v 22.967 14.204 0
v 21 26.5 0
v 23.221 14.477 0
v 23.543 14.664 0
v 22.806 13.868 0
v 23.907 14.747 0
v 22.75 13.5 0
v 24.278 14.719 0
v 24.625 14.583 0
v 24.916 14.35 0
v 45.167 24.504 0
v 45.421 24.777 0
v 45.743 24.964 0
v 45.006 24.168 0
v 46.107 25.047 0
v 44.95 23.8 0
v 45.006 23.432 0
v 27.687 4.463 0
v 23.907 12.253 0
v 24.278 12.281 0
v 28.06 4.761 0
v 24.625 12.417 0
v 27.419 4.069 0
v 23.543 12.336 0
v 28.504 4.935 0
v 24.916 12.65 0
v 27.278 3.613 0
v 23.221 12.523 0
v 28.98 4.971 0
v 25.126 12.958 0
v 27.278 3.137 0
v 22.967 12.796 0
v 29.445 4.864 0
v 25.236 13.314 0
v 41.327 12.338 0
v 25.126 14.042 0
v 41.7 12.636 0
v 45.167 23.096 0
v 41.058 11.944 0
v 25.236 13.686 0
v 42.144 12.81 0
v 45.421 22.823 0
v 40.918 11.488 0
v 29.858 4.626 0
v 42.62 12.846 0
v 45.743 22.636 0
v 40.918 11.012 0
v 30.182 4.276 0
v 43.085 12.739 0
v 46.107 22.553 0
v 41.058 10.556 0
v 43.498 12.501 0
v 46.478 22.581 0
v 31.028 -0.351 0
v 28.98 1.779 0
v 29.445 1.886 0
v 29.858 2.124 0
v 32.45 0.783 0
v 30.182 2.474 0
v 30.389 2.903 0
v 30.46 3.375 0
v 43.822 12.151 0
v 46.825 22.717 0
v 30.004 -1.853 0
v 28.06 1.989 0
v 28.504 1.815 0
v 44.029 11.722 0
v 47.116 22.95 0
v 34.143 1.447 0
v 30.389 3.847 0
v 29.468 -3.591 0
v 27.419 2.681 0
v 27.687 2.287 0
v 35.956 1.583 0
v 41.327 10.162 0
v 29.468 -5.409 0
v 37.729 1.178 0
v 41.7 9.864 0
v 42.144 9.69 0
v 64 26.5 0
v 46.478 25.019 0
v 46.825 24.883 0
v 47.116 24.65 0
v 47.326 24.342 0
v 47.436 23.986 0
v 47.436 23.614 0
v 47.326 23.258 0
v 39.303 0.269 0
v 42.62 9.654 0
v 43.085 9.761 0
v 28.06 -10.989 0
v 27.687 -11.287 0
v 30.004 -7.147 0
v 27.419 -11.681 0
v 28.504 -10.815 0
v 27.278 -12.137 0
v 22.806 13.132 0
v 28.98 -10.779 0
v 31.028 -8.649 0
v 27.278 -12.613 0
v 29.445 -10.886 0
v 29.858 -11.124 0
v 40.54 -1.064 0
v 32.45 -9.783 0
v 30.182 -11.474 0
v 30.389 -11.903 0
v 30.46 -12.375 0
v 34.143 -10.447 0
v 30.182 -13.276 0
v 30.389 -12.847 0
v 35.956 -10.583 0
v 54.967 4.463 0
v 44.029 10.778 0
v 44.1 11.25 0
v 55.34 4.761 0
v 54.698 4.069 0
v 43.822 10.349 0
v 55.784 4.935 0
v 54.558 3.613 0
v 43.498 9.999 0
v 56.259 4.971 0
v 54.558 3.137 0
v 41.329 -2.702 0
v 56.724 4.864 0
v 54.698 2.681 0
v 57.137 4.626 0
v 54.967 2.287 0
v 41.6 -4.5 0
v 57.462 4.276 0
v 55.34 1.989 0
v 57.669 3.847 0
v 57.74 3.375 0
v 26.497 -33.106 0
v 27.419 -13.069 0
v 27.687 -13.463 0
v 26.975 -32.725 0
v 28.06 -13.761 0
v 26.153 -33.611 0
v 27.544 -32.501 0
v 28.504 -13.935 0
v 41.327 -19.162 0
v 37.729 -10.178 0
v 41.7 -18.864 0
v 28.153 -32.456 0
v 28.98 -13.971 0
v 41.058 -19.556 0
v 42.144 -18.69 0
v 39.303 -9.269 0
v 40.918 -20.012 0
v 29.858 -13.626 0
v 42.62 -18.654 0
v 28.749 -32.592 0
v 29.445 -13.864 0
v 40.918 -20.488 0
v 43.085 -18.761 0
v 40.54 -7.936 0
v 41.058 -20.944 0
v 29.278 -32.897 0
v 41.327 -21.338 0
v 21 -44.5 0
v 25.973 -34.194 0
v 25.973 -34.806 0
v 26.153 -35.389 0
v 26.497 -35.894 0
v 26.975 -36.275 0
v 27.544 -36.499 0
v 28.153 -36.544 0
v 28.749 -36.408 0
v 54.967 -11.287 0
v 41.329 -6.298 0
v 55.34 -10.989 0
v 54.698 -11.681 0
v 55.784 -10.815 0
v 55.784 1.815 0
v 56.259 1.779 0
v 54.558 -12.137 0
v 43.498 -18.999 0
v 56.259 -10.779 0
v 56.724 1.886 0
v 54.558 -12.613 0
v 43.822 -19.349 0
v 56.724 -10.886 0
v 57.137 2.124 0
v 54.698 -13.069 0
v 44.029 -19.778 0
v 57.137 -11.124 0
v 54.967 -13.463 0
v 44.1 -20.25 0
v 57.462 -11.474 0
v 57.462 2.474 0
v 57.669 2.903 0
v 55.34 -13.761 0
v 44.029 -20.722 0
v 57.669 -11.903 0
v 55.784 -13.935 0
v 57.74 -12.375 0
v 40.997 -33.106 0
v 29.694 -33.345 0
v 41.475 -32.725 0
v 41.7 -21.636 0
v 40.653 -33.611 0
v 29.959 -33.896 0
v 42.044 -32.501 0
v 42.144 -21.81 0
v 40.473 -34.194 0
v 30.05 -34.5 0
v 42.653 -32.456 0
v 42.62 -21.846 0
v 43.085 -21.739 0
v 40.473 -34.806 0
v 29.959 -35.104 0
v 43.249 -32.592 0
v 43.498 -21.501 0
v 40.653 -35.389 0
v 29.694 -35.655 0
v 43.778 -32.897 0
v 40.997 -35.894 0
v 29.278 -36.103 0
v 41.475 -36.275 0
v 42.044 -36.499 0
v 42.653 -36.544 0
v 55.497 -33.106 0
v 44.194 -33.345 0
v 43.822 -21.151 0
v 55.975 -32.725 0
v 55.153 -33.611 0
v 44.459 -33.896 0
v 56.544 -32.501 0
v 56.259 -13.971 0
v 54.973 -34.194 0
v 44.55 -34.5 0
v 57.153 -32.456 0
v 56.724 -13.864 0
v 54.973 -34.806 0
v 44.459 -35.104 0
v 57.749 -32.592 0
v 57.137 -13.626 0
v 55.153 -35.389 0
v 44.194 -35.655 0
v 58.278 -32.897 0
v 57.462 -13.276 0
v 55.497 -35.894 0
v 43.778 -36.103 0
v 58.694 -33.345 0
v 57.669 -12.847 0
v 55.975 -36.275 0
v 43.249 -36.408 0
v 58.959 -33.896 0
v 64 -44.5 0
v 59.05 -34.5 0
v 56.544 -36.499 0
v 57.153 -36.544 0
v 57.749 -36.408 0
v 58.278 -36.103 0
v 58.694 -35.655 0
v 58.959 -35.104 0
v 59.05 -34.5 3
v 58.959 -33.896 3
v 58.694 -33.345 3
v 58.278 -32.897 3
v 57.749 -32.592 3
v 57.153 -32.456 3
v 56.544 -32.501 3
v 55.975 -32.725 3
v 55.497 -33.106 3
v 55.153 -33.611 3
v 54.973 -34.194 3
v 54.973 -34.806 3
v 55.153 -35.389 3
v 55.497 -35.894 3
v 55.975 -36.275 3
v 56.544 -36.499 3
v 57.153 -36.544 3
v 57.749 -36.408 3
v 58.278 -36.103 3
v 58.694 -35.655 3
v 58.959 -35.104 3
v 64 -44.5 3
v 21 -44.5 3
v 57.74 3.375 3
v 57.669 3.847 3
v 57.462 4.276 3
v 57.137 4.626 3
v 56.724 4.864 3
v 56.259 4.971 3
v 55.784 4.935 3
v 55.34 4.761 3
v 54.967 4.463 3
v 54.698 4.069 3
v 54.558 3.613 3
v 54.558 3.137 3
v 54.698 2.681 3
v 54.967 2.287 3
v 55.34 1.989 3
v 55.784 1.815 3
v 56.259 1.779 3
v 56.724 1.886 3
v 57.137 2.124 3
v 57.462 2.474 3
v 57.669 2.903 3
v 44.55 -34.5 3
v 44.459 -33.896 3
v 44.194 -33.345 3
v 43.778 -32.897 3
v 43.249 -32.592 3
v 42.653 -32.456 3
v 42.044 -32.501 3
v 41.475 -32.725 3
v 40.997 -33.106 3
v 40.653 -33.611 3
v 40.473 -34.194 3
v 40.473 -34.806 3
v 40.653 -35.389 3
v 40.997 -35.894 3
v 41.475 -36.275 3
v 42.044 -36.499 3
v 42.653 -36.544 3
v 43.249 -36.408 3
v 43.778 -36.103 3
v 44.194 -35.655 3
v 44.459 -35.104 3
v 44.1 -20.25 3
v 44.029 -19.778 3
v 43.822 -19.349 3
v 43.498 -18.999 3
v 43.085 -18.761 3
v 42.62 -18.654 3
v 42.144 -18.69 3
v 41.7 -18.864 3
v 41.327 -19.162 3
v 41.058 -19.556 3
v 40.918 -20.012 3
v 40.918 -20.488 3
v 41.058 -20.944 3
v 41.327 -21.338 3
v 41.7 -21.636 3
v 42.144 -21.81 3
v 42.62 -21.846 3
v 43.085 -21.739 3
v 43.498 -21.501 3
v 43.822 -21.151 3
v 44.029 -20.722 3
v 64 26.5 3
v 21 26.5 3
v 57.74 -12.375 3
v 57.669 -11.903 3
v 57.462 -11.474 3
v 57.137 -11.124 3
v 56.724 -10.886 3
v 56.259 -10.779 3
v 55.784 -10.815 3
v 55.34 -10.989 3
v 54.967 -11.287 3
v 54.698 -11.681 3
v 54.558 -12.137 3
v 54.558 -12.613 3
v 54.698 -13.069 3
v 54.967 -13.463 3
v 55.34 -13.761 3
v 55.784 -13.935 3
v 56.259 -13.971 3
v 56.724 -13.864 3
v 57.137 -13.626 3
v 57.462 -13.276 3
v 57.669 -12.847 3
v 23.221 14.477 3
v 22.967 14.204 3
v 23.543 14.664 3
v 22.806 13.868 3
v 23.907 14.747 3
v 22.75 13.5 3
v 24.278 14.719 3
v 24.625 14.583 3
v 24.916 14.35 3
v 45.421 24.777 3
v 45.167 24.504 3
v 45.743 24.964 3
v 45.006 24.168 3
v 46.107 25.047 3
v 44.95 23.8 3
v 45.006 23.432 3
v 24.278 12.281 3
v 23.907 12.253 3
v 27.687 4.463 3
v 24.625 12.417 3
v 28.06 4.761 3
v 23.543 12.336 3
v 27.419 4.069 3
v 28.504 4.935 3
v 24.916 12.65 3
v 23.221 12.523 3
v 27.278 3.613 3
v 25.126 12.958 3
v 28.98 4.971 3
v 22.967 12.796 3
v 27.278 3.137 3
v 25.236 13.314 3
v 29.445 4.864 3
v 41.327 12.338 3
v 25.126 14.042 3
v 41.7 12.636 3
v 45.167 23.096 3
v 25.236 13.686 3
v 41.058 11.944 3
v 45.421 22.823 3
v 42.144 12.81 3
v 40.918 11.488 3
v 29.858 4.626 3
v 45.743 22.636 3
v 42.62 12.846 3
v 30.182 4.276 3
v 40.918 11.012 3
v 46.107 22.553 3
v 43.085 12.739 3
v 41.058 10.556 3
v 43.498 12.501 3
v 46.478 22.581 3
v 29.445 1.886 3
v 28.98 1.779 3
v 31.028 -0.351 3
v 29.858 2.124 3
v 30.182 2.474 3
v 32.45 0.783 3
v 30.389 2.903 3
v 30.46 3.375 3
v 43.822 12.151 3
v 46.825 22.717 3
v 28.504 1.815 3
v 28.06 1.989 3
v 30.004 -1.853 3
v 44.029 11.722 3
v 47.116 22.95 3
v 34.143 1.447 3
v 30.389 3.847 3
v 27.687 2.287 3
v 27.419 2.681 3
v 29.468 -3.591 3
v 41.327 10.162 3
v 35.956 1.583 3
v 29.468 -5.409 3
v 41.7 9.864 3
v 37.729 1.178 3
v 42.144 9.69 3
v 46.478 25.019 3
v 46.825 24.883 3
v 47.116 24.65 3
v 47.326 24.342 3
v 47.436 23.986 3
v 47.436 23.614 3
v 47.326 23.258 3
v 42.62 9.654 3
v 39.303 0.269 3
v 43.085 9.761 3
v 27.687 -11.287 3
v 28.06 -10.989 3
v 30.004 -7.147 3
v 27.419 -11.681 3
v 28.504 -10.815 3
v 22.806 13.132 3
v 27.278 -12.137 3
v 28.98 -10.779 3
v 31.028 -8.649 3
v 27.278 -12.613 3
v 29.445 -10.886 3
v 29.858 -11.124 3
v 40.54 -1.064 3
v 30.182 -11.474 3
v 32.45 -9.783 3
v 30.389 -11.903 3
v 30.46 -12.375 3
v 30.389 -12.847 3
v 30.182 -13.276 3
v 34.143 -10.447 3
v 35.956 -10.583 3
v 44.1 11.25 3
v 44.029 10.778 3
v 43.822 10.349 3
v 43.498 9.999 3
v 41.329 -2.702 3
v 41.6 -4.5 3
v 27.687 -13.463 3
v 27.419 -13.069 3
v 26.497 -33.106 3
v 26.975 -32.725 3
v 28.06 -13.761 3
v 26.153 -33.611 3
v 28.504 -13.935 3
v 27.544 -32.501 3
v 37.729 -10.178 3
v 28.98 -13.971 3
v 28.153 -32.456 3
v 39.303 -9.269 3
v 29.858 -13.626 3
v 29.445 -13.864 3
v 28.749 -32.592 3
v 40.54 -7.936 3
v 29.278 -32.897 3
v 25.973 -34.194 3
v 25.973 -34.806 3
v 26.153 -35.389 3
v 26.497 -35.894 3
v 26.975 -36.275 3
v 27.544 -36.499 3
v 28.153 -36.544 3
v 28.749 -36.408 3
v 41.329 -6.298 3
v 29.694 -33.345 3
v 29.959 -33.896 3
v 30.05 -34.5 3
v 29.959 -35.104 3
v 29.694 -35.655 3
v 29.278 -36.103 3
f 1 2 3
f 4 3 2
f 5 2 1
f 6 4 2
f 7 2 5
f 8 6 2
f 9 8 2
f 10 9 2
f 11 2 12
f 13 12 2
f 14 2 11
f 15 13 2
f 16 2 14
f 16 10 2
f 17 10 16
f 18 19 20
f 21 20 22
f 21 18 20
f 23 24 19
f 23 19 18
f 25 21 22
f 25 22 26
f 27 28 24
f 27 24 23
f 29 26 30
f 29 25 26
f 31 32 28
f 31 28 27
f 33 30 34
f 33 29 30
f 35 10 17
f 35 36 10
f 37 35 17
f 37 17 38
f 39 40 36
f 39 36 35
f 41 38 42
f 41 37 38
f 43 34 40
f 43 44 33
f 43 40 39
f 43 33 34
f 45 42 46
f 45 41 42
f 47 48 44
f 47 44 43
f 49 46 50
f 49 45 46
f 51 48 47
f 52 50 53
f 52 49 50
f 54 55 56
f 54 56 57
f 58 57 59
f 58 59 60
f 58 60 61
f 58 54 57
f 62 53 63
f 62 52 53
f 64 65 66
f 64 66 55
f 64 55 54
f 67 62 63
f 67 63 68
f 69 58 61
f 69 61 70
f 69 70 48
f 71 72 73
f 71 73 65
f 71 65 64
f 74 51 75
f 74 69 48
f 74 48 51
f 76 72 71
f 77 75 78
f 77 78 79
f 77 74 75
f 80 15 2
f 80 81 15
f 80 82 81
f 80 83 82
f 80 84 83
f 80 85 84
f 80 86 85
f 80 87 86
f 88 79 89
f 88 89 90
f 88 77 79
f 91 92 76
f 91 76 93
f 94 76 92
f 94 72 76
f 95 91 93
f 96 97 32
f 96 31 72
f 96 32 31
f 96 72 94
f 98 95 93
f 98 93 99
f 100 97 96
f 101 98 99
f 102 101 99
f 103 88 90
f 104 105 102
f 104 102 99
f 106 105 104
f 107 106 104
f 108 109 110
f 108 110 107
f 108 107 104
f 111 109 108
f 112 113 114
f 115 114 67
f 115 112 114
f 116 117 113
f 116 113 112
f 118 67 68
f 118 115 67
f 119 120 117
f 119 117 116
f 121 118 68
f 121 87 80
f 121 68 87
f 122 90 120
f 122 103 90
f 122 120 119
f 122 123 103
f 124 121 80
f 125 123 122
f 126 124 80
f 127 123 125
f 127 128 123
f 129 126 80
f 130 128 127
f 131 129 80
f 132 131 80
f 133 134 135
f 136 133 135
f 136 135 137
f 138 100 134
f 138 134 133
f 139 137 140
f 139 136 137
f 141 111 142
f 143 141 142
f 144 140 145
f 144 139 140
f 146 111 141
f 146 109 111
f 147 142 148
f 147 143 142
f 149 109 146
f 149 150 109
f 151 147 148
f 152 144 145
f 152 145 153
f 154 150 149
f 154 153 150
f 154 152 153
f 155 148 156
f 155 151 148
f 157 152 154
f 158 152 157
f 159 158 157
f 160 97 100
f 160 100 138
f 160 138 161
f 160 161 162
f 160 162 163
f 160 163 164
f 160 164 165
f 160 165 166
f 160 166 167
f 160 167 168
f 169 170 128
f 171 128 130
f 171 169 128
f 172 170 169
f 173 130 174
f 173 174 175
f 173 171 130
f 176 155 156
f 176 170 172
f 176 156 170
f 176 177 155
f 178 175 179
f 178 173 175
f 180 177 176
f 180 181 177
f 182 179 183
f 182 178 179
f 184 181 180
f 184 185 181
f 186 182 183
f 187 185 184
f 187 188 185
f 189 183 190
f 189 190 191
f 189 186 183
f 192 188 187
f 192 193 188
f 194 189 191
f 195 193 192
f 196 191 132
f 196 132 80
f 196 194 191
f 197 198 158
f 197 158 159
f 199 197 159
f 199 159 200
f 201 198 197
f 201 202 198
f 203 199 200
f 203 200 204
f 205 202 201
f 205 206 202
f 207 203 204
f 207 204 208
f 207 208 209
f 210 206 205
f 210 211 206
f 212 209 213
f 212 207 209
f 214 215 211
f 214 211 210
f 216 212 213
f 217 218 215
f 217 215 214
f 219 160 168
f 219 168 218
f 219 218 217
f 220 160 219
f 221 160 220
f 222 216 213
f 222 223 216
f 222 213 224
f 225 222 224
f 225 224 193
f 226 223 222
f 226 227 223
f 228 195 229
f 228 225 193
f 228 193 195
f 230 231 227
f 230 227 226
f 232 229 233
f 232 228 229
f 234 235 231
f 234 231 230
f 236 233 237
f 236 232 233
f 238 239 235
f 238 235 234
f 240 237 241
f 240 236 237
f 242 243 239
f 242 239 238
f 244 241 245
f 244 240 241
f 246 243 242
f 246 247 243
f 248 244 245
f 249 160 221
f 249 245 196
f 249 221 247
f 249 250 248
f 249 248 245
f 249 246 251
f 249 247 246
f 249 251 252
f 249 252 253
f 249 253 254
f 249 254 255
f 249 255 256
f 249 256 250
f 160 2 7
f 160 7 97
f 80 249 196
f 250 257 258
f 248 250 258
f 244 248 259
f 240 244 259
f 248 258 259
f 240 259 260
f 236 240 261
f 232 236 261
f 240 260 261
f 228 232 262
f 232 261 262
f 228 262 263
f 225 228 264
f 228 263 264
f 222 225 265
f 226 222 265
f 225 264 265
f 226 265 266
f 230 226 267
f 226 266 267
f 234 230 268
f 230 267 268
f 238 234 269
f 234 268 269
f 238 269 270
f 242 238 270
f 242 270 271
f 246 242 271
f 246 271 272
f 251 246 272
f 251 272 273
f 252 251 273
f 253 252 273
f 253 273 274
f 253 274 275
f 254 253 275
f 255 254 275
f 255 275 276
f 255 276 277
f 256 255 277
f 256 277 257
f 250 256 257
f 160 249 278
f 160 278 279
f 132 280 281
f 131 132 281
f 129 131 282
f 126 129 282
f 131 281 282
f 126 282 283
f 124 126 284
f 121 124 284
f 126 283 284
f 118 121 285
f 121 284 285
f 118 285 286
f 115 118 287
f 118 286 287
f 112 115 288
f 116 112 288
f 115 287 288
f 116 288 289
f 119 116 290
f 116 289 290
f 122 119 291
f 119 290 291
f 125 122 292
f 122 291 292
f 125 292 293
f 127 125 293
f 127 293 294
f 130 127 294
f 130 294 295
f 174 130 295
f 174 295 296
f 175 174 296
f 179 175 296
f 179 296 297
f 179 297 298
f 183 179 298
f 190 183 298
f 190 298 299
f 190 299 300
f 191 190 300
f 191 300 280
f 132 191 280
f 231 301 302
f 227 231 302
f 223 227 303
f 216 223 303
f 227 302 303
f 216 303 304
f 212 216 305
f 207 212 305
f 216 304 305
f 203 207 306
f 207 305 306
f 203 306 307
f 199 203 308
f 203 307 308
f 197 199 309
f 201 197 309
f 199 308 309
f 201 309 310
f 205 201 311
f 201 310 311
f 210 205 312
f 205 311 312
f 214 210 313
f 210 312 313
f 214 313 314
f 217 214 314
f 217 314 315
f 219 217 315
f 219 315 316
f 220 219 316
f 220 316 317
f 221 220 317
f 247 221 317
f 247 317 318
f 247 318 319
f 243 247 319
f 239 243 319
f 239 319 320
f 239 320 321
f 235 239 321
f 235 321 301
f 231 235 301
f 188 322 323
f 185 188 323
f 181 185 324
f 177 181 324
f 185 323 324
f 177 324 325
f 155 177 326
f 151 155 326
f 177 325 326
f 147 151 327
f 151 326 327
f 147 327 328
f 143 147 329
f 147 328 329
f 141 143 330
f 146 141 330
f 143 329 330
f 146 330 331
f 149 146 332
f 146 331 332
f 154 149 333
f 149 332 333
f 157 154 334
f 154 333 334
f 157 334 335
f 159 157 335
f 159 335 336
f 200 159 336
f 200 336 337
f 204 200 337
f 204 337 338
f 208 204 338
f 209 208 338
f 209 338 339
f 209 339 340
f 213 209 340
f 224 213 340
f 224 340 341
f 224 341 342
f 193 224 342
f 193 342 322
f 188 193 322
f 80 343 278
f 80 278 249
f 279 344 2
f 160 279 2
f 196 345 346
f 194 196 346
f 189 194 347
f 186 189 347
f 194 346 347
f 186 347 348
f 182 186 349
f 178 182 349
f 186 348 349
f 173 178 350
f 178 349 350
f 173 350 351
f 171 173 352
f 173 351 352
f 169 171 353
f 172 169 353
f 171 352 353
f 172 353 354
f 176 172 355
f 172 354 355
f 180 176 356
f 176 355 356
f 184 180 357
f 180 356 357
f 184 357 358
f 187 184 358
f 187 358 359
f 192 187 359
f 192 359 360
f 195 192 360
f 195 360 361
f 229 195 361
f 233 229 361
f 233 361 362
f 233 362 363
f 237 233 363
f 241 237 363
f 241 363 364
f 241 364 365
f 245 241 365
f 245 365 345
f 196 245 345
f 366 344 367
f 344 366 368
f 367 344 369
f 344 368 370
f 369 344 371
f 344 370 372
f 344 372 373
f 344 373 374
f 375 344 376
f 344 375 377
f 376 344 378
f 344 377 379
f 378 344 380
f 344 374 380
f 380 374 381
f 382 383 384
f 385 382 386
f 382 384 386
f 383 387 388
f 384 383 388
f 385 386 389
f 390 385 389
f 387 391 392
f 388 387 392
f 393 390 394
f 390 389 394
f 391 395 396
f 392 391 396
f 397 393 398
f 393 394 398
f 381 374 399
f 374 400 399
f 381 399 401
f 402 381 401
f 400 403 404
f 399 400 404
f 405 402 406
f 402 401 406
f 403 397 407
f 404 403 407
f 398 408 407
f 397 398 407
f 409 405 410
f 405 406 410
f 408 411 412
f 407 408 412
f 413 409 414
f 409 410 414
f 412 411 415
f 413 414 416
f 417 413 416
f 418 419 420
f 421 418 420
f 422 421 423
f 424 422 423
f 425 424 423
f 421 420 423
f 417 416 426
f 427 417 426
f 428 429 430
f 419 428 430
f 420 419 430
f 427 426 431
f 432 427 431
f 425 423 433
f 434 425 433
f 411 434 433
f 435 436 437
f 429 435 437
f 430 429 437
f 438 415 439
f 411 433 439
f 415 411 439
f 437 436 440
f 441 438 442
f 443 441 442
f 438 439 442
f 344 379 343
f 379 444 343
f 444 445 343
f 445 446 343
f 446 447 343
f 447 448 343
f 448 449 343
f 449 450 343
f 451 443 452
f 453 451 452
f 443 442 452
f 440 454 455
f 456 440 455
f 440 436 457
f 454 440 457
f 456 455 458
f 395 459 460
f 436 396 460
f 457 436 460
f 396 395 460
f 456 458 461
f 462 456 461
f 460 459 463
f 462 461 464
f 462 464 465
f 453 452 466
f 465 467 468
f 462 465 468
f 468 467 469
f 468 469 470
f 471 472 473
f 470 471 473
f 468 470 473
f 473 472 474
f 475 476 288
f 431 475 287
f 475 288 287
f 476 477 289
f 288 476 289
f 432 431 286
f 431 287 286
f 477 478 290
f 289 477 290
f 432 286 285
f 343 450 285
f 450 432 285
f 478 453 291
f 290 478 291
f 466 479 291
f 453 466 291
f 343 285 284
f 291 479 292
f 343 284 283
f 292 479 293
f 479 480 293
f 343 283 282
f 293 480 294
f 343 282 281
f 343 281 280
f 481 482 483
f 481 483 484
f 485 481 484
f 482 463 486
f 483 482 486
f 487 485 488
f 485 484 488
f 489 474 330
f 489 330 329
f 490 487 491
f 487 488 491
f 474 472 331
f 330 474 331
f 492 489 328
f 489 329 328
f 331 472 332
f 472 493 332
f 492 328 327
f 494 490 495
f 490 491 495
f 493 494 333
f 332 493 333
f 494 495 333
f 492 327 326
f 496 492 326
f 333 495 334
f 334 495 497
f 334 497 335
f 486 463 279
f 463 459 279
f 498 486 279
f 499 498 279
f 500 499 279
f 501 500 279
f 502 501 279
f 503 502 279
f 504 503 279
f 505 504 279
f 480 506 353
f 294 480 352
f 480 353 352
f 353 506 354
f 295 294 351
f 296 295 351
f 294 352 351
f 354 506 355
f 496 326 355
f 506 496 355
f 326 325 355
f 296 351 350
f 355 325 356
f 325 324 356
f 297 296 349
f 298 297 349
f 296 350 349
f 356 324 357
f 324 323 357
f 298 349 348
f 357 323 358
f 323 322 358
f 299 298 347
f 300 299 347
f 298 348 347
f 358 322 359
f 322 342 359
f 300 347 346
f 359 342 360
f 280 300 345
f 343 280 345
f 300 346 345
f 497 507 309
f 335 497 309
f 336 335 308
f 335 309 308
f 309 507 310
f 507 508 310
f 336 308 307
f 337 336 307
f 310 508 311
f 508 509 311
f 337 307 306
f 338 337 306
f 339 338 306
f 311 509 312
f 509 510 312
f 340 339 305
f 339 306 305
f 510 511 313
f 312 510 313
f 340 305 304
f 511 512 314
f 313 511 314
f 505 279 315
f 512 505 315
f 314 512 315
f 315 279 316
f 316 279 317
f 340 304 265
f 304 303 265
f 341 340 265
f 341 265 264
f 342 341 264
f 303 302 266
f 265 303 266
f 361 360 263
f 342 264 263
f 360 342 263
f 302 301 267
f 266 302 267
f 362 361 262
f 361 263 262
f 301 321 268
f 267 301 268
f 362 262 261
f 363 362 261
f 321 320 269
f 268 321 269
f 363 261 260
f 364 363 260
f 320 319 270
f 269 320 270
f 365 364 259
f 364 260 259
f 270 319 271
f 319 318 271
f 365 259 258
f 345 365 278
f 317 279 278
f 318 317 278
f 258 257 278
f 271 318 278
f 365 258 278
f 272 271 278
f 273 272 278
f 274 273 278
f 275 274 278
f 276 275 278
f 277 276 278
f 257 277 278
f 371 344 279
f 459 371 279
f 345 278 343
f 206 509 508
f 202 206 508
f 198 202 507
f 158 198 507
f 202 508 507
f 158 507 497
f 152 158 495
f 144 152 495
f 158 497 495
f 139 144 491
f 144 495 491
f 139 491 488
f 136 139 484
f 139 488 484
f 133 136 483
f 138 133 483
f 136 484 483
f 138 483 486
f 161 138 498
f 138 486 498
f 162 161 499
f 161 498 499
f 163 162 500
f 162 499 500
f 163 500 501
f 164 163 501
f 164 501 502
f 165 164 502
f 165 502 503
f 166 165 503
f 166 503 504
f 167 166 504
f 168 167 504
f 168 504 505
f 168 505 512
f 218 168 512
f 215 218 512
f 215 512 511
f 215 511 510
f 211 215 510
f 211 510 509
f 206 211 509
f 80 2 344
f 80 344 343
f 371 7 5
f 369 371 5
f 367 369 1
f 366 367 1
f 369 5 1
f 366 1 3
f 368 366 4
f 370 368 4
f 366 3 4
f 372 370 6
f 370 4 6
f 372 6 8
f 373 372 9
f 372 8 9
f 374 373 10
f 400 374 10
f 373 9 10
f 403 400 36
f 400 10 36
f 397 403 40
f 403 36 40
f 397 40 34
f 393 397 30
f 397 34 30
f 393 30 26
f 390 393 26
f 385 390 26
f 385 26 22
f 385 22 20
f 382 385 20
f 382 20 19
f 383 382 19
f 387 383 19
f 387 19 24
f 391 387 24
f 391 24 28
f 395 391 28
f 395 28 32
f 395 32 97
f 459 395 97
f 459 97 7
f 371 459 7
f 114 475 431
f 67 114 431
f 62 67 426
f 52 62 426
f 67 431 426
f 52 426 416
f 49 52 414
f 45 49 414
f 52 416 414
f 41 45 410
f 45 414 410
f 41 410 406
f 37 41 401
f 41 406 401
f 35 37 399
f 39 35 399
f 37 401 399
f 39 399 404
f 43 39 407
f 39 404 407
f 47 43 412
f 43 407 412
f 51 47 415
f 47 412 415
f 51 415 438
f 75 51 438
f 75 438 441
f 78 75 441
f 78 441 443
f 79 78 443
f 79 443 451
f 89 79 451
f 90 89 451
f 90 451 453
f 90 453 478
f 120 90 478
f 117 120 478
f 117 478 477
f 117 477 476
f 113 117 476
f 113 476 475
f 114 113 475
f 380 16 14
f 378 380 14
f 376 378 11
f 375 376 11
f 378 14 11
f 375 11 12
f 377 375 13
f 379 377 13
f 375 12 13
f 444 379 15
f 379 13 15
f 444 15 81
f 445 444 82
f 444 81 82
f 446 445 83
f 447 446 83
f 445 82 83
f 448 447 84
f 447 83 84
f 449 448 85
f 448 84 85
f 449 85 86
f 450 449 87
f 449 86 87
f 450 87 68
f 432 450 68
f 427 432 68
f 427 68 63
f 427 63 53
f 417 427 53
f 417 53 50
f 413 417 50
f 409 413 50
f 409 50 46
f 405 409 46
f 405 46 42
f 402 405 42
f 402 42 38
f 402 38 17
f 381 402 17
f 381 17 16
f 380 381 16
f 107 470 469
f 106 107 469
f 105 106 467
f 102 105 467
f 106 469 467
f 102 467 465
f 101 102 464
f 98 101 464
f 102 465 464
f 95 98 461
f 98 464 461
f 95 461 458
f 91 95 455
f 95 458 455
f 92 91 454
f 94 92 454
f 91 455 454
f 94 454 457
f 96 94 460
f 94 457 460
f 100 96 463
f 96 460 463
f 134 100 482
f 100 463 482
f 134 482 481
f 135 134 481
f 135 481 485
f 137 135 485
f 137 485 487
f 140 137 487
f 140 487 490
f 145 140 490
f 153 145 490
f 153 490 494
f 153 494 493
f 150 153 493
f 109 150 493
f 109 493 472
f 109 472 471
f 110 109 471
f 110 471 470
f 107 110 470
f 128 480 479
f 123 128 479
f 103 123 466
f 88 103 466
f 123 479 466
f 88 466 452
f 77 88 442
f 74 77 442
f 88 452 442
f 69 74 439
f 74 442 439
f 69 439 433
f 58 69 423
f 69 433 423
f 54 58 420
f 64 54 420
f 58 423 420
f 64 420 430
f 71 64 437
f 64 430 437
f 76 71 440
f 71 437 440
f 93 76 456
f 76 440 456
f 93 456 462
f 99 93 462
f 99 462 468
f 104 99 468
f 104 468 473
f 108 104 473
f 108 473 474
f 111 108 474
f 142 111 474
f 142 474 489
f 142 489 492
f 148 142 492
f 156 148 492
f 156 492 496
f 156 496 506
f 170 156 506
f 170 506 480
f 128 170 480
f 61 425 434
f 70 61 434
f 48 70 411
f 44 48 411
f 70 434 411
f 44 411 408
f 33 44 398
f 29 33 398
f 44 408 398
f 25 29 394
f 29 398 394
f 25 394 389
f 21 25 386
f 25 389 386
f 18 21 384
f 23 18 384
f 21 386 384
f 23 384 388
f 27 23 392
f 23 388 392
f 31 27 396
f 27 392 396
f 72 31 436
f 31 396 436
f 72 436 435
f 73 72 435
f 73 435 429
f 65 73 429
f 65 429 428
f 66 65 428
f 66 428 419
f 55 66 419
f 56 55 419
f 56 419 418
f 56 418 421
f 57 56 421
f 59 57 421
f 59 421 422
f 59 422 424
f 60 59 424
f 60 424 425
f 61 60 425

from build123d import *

# Parameters (mm, degrees)
SKETCH_1_W               = 40
SKETCH_1_H               = 29
EXTRUDE_1_DEPTH          = 3
CUT_EXTRUDE_1_DEPTH      = 3
SKETCH_3_W               = 40
SKETCH_3_H               = 3
EXTRUDE_2_DEPTH          = 10
SKETCH_4_W               = 40
SKETCH_4_H               = 3
EXTRUDE_3_DEPTH          = 10
SKETCH_6_W               = 3
SKETCH_6_H               = 49
EXTRUDE_5_DEPTH          = 42
SKETCH_8_W               = 3
SKETCH_8_H               = 49
EXTRUDE_6_DEPTH          = 2
SKETCH_9_W               = 3
SKETCH_9_H               = 49
EXTRUDE_7_DEPTH          = 2
SKETCH_10_W              = 86
SKETCH_10_H              = 3
EXTRUDE_8_DEPTH          = 10
SKETCH_11_W              = 86
SKETCH_11_H              = 3
EXTRUDE_9_DEPTH          = 10
SKETCH_14_W              = 3
SKETCH_14_H              = 69
CUT_EXTRUDE_5_DEPTH      = 43
SKETCH_17_W              = 43
SKETCH_17_H              = 3
EXTRUDE_10_DEPTH         = 20
SKETCH_18_R              = 2.05
CUT_EXTRUDE_6_DEPTH      = 10
SKETCH_20_W              = 43
SKETCH_20_H              = 3
EXTRUDE_11_DEPTH         = 10
SKETCH_21_W              = 43
SKETCH_21_H              = 3
CUT_EXTRUDE_7_DEPTH      = 10
SKETCH_24_W              = 43
SKETCH_24_H              = 3
EXTRUDE_12_DEPTH         = 10
SKETCH_28_R              = 1.6
SKETCH_28_R_2            = 6.1
CUT_EXTRUDE_9_DEPTH      = 10
SKETCH_29_W              = 43
SKETCH_29_H              = 3
CUT_EXTRUDE_10_DEPTH     = 20
SKETCH_30_R              = 2.05
CUT_EXTRUDE_11_DEPTH     = 10
M3X0_5_1_D               = 2.5
M3X0_5_1_DEPTH           = 8.5
M3X0_5_1_TIP             = 0.751075774
M3X0_5_1_ON_FACE_2_D     = 2.5
M3X0_5_1_ON_FACE_2_DEPTH = 8.5
M3X0_5_1_ON_FACE_2_TIP   = 0.751075774
SKETCH_32_W              = 43
SKETCH_32_H              = 3
CUT_EXTRUDE_12_DEPTH     = 8


with BuildPart() as part:
    # ｽｹｯﾁ1 → ﾎﾞｽ - 押し出し1 (new body)
    with BuildSketch(Plane.XY):
        Rectangle(SKETCH_1_W, SKETCH_1_H)
    extrude(amount=EXTRUDE_1_DEPTH)

    # ｽｹｯﾁ2 → ｶｯﾄ - 押し出し1 (cut)
    with BuildSketch(Plane.XY.offset(3)):
        with BuildLine():
            ThreePointArc((-14.4, 10.5), (-15.01507576, 11.98492424), (-16.5, 12.6))
            Line((-16.5, 12.6), (-16.5, 10.5))
            Line((-16.5, 10.5), (-18.6, 10.5))
            ThreePointArc((-18.6, 10.5), (-16.5, 8.4), (-14.4, 10.5))
        make_face()
        with BuildLine():
            Line((-16.5, 10.5), (-16.5, 12.6))
            ThreePointArc((-16.5, 12.6), (-17.98492424, 11.98492424), (-18.6, 10.5))
            Line((-18.6, 10.5), (-16.5, 10.5))
        make_face()
        with BuildLine():
            ThreePointArc((-18.6, -10.5), (-17.98492424, -11.98492424), (-16.5, -12.6))
            Line((-16.5, -12.6), (-16.5, -10.5))
            Line((-16.5, -10.5), (-18.6, -10.5))
        make_face()
        with BuildLine():
            Line((-16.5, -10.5), (-16.5, -12.6))
            ThreePointArc((-16.5, -12.6), (-15.01507576, -11.98492424), (-14.4, -10.5))
            ThreePointArc((-14.4, -10.5), (-16.5, -8.4), (-18.6, -10.5))
            Line((-18.6, -10.5), (-16.5, -10.5))
        make_face()
        with BuildLine():
            ThreePointArc((18.6, -10.5), (15.01507576, -9.01507576), (16.5, -12.6))
            Line((16.5, -12.6), (16.5, -10.5))
            Line((16.5, -10.5), (18.6, -10.5))
        make_face()
        with BuildLine():
            Line((16.5, -10.5), (16.5, -12.6))
            ThreePointArc((16.5, -12.6), (17.98492424, -11.98492424), (18.6, -10.5))
            Line((18.6, -10.5), (16.5, -10.5))
        make_face()
        with BuildLine():
            ThreePointArc((18.6, 10.5), (17.98492424, 11.98492424), (16.5, 12.6))
            Line((16.5, 12.6), (16.5, 10.5))
            Line((16.5, 10.5), (18.6, 10.5))
        make_face()
        with BuildLine():
            Line((16.5, 10.5), (16.5, 12.6))
            ThreePointArc((16.5, 12.6), (15.01507576, 9.01507576), (18.6, 10.5))
            Line((18.6, 10.5), (16.5, 10.5))
        make_face()
    extrude(amount=-CUT_EXTRUDE_1_DEPTH, mode=Mode.SUBTRACT)

    # ｽｹｯﾁ3 → ﾎﾞｽ - 押し出し2 (add)
    with BuildSketch(Plane.XZ.offset(14.5)):
        with Locations((0, 1.5)):
            Rectangle(SKETCH_3_W, SKETCH_3_H)
    extrude(amount=EXTRUDE_2_DEPTH)

    # ｽｹｯﾁ4 → ﾎﾞｽ - 押し出し3 (add)
    with BuildSketch(Plane(origin=(0, 14.5, 0), x_dir=(1, 0, 0), z_dir=(0, 1, 0))):
        with Locations((0, -1.5)):
            Rectangle(SKETCH_4_W, SKETCH_4_H)
    extrude(amount=EXTRUDE_3_DEPTH)

    # ｽｹｯﾁ6 → ﾎﾞｽ - 押し出し5 (add)
    with BuildSketch(Plane(origin=(20, 0, 0), x_dir=(0, 0, -1), z_dir=(1, 0, 0))):
        with Locations((-1.5, 0)):
            Rectangle(SKETCH_6_W, SKETCH_6_H)
    extrude(amount=EXTRUDE_5_DEPTH)

    # ｽｹｯﾁ8 → ﾎﾞｽ - 押し出し6 (add)
    with BuildSketch(Plane.ZY.offset(20)):
        with Locations((1.5, 0)):
            Rectangle(SKETCH_8_W, SKETCH_8_H)
    extrude(amount=EXTRUDE_6_DEPTH)

    # ｽｹｯﾁ9 → ﾎﾞｽ - 押し出し7 (add)
    with BuildSketch(Plane(origin=(62, 0, 0), x_dir=(0, 0, -1), z_dir=(1, 0, 0))):
        with Locations((-1.5, 0)):
            Rectangle(SKETCH_9_W, SKETCH_9_H)
    extrude(amount=EXTRUDE_7_DEPTH)

    # ｽｹｯﾁ10 → ﾎﾞｽ - 押し出し8 (add)
    with BuildSketch(Plane.XZ.offset(24.5)):
        with Locations((21, 1.5)):
            Rectangle(SKETCH_10_W, SKETCH_10_H)
    extrude(amount=EXTRUDE_8_DEPTH)

    # ｽｹｯﾁ11 → ﾎﾞｽ - 押し出し9 (add)
    with BuildSketch(Plane(origin=(0, 24.5, 0), x_dir=(1, 0, 0), z_dir=(0, 1, 0))):
        with Locations((21, -1.5)):
            Rectangle(SKETCH_11_W, SKETCH_11_H)
    extrude(amount=EXTRUDE_9_DEPTH)

    # ｽｹｯﾁ14 → ｶｯﾄ - 押し出し5 (cut)
    with BuildSketch(Plane.ZY.offset(22)):
        with Locations((1.5, 0)):
            Rectangle(SKETCH_14_W, SKETCH_14_H)
    extrude(amount=-CUT_EXTRUDE_5_DEPTH, mode=Mode.SUBTRACT)

    # ｽｹｯﾁ17 → ﾎﾞｽ - 押し出し10 (add)
    with BuildSketch(Plane.XZ.offset(34.5)):
        with Locations((42.5, 1.5)):
            Rectangle(SKETCH_17_W, SKETCH_17_H)
    extrude(amount=EXTRUDE_10_DEPTH)

    # ｽｹｯﾁ18 → ｶｯﾄ - 押し出し6 (cut)
    with BuildSketch(Plane.XY.offset(3)):
        with Locations((28, -34.5)):
            Circle(SKETCH_18_R)
        with Locations((57, -34.5)):
            Circle(SKETCH_18_R)
    extrude(amount=-CUT_EXTRUDE_6_DEPTH, mode=Mode.SUBTRACT)

    # ｽｹｯﾁ20 → ﾎﾞｽ - 押し出し11 (add)
    with BuildSketch(Plane.XZ.offset(54.5)):
        with Locations((42.5, 1.5)):
            Rectangle(SKETCH_20_W, SKETCH_20_H)
    extrude(amount=EXTRUDE_11_DEPTH)

    # ｽｹｯﾁ21 → ｶｯﾄ - 押し出し7 (cut)
    with BuildSketch(Plane(origin=(0, 34.5, 0), x_dir=(1, 0, 0), z_dir=(0, 1, 0))):
        with Locations((42.5, -1.5)):
            Rectangle(SKETCH_21_W, SKETCH_21_H)
    extrude(amount=-CUT_EXTRUDE_7_DEPTH, mode=Mode.SUBTRACT)

    # ｽｹｯﾁ24 → ﾎﾞｽ - 押し出し12 (add)
    with BuildSketch(Plane(origin=(0, 24.5, 0), x_dir=(1, 0, 0), z_dir=(0, 1, 0))):
        with Locations((42.5, -1.5)):
            Rectangle(SKETCH_24_W, SKETCH_24_H)
    extrude(amount=EXTRUDE_12_DEPTH)

    # ｽｹｯﾁ28 → ｶｯﾄ - 押し出し9 (cut)
    with BuildSketch(Plane.XY.offset(3)):
        with Locations((42.5, 11.25)):
            Circle(SKETCH_28_R)
        with Locations((28.86009989, 3.375)):
            Circle(SKETCH_28_R)
        with Locations((56.13990011, 3.375)):
            Circle(SKETCH_28_R)
        with Locations((35.5, -4.5)):
            Circle(SKETCH_28_R_2)
        with Locations((56.13990011, -12.375)):
            Circle(SKETCH_28_R)
        with Locations((42.5, -20.25)):
            Circle(SKETCH_28_R)
        with Locations((28.86009989, -12.375)):
            Circle(SKETCH_28_R)
    extrude(amount=-CUT_EXTRUDE_9_DEPTH, mode=Mode.SUBTRACT)

    # ｽｹｯﾁ29 → ｶｯﾄ - 押し出し10 (cut)
    with BuildSketch(Plane(origin=(0, -64.5, 0), x_dir=(-1, 0, 0), z_dir=(0, -1, 0))):
        with Locations((-42.5, -1.5)):
            Rectangle(SKETCH_29_W, SKETCH_29_H)
    extrude(amount=-CUT_EXTRUDE_10_DEPTH, mode=Mode.SUBTRACT)

    # ｽｹｯﾁ30 → ｶｯﾄ - 押し出し11 (cut)
    with BuildSketch(Plane.XY.offset(3)):
        with Locations((42.5, -34.5)):
            Circle(SKETCH_30_R)
    extrude(amount=-CUT_EXTRUDE_11_DEPTH, mode=Mode.SUBTRACT)

    # M3x0.5 ねじ穴1
    with Locations(Plane(origin=(24, 13.5, 3), x_dir=(1, 0, 0), z_dir=(0, 0, 1))):
        with Locations((0, 0), (22.2, 10.3)):
            Hole(M3X0_5_1_D / 2, depth=M3X0_5_1_DEPTH)
            with Locations((0, 0, -(M3X0_5_1_DEPTH + M3X0_5_1_TIP / 2))):  # 118° drill point
                Cone(0, M3X0_5_1_D / 2, M3X0_5_1_TIP, mode=Mode.SUBTRACT)

    # M3x0.5 ねじ穴1 on face 2
    with Locations(Plane(origin=(29.171215171, -61.022508803, 0), x_dir=(1, 0, 0), z_dir=(0, 0, 1))):
        with Locations((0, 0)):
            Hole(M3X0_5_1_ON_FACE_2_D / 2, depth=M3X0_5_1_ON_FACE_2_DEPTH)
            with Locations((0, 0, -(M3X0_5_1_ON_FACE_2_DEPTH + M3X0_5_1_ON_FACE_2_TIP / 2))):  # 118° drill point
                Cone(0, M3X0_5_1_ON_FACE_2_D / 2, M3X0_5_1_ON_FACE_2_TIP, mode=Mode.SUBTRACT)

    # ｽｹｯﾁ32 → ｶｯﾄ - 押し出し12 (cut)
    with BuildSketch(Plane(origin=(0, 34.5, 0), x_dir=(1, 0, 0), z_dir=(0, 1, 0))):
        with Locations((42.5, -1.5)):
            Rectangle(SKETCH_32_W, SKETCH_32_H)
    extrude(amount=-CUT_EXTRUDE_12_DEPTH, mode=Mode.SUBTRACT)


solid = part.part
